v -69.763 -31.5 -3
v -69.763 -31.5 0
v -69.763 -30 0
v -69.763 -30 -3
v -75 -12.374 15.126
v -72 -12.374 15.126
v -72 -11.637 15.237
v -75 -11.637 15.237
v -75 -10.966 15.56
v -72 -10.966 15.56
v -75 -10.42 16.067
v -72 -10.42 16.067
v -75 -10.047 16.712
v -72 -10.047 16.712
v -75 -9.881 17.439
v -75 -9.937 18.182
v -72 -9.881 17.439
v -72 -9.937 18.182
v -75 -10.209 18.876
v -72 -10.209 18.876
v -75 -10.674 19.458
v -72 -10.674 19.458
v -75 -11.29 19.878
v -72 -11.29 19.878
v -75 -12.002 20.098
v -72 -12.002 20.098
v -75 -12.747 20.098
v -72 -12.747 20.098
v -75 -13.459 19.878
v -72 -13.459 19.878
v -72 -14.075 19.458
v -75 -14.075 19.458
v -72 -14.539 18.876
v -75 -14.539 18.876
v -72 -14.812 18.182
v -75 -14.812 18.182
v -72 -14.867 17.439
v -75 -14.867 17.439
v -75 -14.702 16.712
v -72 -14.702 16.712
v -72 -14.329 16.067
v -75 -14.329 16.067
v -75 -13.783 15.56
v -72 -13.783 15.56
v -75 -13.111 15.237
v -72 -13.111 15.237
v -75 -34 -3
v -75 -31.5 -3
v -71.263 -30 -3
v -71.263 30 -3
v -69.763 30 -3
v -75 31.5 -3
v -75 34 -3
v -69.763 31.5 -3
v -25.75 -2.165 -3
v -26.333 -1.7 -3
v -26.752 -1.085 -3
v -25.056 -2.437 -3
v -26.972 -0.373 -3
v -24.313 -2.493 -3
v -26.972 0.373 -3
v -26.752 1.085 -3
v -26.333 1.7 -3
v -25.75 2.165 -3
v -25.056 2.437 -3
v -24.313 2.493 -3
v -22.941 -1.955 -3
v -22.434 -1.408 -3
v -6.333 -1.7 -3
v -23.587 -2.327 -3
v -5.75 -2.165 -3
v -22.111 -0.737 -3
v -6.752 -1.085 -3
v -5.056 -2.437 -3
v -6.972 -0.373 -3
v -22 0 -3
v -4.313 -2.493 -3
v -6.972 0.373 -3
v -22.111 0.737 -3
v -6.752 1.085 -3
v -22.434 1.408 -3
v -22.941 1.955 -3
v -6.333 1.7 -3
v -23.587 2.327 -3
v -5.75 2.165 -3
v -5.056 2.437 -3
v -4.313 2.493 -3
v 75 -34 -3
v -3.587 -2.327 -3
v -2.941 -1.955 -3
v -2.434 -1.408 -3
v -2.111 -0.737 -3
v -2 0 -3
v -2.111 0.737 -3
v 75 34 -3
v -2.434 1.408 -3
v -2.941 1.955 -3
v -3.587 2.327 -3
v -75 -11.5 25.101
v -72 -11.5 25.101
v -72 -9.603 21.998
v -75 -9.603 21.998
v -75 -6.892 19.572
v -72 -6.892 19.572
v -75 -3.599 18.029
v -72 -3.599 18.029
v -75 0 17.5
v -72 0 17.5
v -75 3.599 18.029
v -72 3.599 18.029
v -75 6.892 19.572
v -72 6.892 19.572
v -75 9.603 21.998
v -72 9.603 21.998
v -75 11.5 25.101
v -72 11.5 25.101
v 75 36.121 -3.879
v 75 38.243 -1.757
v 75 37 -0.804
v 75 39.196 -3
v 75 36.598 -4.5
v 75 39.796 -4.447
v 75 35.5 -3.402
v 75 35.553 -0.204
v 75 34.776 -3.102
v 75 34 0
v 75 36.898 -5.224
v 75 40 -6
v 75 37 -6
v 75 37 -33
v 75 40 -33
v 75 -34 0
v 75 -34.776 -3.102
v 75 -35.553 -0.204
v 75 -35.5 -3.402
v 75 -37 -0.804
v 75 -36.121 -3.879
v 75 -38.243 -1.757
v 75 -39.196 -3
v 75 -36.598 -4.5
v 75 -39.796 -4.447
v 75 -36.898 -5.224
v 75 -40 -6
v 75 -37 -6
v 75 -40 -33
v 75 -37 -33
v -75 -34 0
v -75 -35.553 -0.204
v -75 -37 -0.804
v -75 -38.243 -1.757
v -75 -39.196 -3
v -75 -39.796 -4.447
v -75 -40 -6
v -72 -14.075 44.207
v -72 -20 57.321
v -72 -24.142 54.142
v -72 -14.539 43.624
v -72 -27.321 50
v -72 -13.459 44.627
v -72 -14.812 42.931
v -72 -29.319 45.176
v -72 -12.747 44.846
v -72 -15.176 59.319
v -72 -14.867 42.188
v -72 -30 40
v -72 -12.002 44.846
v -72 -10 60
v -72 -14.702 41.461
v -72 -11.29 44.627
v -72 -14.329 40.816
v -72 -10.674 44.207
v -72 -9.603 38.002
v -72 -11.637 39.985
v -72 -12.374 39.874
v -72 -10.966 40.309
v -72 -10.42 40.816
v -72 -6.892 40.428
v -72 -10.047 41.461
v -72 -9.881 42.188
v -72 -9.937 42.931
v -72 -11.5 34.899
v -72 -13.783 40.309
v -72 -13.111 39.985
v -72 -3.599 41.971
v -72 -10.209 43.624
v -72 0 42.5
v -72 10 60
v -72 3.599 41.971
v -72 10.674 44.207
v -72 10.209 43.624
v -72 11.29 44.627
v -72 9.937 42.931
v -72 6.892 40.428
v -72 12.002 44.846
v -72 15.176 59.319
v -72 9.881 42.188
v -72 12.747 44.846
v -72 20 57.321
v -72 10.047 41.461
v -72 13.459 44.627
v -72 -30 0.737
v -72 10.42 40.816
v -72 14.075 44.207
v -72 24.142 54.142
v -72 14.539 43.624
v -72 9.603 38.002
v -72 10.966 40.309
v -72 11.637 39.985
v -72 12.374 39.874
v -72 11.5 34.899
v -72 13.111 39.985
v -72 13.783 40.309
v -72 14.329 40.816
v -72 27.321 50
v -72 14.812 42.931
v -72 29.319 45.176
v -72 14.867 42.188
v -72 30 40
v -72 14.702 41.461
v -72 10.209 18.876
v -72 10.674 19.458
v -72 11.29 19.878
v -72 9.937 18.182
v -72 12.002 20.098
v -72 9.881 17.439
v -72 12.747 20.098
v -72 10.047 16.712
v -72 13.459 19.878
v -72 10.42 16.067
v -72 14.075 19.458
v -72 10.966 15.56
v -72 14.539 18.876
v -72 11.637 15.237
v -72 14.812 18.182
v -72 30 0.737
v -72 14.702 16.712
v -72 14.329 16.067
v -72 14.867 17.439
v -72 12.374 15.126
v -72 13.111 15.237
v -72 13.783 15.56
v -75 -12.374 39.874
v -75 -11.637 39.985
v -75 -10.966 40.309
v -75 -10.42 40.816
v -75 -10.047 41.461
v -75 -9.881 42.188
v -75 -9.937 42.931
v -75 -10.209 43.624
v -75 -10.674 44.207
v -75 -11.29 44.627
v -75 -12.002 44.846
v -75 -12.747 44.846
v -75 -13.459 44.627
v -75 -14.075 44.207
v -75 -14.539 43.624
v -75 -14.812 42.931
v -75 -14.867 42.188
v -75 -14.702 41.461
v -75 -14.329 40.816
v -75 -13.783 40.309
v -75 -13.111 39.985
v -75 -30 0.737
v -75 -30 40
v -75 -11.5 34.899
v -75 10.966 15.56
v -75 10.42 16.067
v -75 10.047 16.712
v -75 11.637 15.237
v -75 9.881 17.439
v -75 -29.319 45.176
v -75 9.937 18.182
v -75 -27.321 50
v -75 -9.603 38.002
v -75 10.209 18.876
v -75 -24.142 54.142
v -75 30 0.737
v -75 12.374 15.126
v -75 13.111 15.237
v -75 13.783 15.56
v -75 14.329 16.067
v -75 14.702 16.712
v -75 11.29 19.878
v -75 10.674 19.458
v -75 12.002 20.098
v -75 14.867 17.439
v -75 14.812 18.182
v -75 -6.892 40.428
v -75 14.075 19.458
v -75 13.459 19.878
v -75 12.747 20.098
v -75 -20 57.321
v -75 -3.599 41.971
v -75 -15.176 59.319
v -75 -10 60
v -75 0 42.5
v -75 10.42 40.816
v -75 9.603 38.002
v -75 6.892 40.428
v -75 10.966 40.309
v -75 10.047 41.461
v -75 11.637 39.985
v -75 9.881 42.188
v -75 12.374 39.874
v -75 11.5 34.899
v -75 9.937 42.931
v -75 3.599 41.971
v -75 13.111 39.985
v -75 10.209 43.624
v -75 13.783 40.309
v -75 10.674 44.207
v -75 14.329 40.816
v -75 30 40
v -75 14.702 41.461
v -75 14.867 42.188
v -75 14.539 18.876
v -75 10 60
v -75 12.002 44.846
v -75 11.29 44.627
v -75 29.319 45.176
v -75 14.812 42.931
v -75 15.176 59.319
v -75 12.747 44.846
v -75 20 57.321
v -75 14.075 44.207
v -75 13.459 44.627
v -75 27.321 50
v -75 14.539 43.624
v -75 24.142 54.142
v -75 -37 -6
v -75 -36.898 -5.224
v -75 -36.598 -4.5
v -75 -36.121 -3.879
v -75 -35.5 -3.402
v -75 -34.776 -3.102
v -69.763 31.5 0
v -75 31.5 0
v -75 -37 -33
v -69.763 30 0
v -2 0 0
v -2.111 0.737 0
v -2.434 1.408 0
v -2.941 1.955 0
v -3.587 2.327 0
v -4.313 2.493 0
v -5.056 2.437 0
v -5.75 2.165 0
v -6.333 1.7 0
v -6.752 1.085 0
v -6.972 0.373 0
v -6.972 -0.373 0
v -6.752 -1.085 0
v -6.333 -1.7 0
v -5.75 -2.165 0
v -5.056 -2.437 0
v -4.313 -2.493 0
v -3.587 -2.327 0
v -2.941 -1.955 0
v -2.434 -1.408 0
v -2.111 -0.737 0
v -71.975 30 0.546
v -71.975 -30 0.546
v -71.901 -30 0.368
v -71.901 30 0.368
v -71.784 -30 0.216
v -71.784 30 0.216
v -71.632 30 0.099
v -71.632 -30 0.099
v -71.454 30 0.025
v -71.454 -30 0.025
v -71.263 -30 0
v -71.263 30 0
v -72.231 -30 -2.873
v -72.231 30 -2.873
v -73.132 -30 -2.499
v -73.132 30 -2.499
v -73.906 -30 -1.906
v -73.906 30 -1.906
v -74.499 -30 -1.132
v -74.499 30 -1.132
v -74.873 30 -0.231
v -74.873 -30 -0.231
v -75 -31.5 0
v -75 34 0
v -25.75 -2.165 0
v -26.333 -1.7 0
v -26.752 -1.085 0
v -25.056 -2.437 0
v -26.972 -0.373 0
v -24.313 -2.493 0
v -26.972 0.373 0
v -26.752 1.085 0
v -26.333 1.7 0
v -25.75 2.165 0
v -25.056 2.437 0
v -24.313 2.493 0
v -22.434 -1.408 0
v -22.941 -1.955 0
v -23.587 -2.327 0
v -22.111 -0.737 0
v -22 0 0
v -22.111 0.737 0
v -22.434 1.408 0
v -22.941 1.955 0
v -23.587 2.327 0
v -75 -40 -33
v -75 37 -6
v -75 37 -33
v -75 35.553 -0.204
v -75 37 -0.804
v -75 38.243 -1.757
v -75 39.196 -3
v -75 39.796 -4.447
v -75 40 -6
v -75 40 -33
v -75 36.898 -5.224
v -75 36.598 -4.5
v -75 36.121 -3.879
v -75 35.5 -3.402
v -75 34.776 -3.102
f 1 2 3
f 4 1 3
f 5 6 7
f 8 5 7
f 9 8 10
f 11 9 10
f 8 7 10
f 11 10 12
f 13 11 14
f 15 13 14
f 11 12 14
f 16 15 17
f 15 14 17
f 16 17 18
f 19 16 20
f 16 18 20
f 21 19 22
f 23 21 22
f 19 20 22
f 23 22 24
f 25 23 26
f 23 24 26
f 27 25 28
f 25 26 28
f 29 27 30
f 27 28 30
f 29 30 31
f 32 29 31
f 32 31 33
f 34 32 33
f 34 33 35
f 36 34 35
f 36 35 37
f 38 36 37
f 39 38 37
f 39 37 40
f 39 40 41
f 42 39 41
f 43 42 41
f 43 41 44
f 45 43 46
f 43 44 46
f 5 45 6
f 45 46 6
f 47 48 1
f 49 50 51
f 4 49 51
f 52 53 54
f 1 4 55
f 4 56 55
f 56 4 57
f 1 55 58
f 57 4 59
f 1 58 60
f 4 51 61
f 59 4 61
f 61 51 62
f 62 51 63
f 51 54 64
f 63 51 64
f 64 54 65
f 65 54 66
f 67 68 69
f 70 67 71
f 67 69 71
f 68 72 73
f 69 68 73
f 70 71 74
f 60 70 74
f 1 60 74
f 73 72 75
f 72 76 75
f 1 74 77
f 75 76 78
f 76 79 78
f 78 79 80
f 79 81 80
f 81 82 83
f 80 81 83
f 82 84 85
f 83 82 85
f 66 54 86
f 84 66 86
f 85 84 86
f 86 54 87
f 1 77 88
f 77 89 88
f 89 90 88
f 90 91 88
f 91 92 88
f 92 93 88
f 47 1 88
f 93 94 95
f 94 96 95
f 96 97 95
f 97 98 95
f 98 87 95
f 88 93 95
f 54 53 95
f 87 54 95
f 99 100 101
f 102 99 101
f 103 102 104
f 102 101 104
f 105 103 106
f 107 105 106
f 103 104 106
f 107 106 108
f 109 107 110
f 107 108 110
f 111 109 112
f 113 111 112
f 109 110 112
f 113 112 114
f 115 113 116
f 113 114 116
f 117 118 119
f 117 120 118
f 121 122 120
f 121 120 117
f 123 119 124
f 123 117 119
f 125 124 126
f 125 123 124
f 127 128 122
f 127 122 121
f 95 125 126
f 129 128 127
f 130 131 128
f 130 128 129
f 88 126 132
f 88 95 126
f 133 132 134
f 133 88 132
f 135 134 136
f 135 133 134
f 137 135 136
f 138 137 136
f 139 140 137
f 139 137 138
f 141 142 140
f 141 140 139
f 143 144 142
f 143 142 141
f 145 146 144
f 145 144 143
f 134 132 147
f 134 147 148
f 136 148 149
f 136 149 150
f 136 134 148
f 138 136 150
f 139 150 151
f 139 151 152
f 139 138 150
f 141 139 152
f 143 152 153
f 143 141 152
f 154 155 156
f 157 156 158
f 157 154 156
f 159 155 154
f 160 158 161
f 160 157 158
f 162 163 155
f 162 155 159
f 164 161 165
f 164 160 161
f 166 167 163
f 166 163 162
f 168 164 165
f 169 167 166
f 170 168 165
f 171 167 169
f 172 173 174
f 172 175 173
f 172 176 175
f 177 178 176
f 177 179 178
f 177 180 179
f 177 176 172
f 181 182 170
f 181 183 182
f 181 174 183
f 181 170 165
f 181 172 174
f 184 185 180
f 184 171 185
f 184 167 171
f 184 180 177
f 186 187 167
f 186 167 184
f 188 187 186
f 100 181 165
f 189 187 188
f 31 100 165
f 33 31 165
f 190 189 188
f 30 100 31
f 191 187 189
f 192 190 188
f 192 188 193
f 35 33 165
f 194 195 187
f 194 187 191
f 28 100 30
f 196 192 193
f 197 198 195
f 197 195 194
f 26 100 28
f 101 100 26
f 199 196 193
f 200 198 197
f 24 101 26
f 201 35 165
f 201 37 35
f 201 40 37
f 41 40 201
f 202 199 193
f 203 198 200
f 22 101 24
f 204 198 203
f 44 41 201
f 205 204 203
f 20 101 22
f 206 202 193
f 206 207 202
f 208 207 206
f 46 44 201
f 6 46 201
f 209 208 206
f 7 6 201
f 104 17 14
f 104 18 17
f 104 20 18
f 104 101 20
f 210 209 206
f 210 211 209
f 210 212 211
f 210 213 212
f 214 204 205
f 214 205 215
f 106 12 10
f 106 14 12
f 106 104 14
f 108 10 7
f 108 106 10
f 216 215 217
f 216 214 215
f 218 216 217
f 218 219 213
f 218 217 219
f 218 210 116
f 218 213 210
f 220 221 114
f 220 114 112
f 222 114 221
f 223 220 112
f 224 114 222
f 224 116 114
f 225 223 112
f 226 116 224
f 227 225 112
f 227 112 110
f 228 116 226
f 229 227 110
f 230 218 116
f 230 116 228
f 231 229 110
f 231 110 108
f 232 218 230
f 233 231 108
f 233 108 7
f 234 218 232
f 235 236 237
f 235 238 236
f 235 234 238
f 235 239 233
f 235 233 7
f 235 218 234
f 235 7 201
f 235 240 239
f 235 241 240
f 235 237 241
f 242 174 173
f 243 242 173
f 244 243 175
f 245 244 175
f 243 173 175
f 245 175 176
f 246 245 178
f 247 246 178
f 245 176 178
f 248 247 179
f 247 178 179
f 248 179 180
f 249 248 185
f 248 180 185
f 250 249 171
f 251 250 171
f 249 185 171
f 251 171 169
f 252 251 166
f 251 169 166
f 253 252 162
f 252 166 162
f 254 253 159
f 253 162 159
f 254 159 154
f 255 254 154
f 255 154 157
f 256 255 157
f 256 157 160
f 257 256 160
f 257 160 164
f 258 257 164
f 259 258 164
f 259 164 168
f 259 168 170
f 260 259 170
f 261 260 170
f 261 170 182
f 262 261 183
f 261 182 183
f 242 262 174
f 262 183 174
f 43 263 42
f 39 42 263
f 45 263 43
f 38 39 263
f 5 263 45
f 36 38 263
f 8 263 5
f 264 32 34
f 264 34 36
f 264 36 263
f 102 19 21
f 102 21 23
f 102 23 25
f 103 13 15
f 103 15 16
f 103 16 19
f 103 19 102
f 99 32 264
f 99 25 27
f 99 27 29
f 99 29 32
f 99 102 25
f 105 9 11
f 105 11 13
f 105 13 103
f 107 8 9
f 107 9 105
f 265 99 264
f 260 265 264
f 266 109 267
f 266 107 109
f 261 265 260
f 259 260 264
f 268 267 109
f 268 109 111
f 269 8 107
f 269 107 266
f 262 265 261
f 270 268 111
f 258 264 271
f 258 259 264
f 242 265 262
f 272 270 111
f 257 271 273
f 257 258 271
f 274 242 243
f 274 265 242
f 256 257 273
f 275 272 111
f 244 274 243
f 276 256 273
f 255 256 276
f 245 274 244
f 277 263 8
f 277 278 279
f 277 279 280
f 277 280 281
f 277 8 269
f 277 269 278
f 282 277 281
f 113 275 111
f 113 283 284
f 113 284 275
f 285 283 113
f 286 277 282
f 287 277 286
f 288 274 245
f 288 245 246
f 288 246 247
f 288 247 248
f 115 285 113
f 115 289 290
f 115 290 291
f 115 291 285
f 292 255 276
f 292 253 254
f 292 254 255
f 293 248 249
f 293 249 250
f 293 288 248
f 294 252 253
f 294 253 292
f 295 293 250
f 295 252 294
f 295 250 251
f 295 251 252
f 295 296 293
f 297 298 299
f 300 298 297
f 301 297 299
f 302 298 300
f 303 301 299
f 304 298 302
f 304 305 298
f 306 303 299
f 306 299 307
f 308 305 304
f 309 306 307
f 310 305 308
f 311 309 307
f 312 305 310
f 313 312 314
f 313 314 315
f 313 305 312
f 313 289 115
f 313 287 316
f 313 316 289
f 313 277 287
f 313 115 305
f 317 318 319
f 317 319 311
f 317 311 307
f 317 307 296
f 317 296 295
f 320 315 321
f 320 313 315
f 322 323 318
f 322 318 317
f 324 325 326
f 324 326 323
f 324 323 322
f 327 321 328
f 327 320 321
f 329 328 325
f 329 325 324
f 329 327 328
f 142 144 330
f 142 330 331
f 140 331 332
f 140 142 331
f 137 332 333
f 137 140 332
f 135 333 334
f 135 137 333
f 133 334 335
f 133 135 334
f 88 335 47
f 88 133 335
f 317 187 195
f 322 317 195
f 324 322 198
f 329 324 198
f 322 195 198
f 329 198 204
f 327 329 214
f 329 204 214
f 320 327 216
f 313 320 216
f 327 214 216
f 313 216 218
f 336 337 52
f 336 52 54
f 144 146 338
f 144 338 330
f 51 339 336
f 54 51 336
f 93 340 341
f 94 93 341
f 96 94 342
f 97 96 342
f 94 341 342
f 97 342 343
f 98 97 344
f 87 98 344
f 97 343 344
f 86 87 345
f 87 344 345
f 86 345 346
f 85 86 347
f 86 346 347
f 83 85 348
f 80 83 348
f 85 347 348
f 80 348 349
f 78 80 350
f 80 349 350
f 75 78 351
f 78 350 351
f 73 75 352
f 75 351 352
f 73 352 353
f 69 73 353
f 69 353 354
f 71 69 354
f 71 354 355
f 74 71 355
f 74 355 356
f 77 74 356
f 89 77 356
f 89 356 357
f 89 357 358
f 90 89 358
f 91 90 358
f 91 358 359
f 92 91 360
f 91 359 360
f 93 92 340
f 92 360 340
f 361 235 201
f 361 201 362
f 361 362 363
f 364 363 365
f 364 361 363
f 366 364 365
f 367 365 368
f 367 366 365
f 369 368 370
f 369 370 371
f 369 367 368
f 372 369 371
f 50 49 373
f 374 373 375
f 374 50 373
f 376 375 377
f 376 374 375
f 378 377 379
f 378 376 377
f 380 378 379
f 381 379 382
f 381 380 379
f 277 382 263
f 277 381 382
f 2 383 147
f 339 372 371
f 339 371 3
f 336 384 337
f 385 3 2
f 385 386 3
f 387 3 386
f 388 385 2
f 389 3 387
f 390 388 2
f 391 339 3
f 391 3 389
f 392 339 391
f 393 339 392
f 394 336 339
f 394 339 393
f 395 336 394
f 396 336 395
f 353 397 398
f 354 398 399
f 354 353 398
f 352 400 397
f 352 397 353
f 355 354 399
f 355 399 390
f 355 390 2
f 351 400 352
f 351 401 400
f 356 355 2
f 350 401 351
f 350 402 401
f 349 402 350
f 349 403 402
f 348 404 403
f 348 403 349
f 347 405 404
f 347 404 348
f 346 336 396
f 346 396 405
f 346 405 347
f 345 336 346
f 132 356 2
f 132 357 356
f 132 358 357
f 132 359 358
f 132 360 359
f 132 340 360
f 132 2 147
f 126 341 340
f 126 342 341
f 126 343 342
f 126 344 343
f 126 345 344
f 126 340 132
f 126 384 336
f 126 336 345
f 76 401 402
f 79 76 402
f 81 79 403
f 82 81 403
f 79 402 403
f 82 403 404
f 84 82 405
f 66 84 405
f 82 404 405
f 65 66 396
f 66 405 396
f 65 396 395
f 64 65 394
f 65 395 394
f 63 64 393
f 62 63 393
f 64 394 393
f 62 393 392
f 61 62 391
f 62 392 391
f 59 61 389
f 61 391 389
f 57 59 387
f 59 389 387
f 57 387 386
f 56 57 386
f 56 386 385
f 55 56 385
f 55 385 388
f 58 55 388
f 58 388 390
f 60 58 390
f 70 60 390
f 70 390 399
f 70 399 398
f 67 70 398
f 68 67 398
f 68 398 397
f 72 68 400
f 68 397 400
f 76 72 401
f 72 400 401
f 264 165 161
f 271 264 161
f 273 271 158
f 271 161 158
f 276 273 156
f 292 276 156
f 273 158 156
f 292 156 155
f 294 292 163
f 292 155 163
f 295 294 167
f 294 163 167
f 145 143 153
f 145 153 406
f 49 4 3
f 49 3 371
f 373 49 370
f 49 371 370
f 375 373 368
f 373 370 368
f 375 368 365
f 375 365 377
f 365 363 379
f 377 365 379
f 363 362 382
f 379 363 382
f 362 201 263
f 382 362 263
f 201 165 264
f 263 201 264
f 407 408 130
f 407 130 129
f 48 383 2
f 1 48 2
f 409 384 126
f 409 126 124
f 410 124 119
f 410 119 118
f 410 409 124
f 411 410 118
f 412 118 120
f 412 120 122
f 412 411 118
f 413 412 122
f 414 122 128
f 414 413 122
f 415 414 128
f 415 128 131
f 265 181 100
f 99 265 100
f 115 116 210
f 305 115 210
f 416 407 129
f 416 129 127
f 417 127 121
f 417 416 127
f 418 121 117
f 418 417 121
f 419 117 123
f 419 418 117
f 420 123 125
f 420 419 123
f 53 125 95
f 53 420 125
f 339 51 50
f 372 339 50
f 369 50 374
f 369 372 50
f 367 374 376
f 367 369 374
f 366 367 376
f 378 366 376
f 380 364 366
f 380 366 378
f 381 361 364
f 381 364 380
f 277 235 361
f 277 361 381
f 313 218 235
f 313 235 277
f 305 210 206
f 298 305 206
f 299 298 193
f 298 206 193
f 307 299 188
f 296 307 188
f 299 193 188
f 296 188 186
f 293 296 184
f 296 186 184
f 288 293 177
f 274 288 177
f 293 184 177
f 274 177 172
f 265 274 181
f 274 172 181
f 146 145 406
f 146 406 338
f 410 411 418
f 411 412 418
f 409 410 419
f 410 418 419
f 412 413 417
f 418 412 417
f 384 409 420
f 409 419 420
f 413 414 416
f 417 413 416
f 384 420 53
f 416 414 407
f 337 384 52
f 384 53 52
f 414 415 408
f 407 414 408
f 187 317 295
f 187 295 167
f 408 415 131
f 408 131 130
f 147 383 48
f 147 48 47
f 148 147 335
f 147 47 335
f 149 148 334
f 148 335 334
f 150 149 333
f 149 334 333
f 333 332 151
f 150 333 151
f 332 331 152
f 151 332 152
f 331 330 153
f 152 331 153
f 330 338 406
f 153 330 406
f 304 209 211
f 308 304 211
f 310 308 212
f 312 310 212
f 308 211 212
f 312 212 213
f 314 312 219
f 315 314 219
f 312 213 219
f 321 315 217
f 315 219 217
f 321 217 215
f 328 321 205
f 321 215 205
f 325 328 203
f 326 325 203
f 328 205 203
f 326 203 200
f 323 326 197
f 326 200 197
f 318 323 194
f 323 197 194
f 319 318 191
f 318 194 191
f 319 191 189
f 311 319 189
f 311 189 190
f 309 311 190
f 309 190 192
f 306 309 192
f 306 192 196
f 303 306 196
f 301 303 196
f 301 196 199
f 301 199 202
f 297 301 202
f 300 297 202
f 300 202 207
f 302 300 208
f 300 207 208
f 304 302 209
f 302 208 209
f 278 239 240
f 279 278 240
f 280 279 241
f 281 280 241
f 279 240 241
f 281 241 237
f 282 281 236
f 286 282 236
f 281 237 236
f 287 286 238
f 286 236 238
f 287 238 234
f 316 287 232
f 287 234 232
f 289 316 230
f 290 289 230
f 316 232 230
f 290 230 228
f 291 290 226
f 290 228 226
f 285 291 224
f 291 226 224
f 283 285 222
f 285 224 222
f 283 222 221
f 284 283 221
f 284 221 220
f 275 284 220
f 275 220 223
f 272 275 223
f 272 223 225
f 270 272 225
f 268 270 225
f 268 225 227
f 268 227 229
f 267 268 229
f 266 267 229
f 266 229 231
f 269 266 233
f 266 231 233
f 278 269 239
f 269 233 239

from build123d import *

# Parameters (mm, degrees)
SCHIZZO1_W                       = 150
SCHIZZO1_H                       = 80
BASE_FLANGIA1_DEPTH              = 3
BORDO_FLANGIA1_STRIP_W           = 18
BORDO_FLANGIA1_STRIP_H           = 3
BORDO_FLANGIA1_STRIP_CUT_DEPTH   = 150
BORDO_FLANGIA1_STRIP_2_W         = 18
BORDO_FLANGIA1_STRIP_2_H         = 3
BORDO_FLANGIA1_STRIP_CUT_2_DEPTH = 150
BORDO_FLANGIA1_DEPTH             = 150
BORDO_FLANGIA1_BEND_DEPTH        = 150
BORDO_FLANGIA3_STRIP_W           = 13.4732
BORDO_FLANGIA3_STRIP_H           = 3
BORDO_FLANGIA3_STRIP_CUT_DEPTH   = 60
BORDO_FLANGIA3_RELIEF_W          = 14.9732
BORDO_FLANGIA3_RELIEF_H          = 1.5
BORDO_FLANGIA3_RELIEF_CUT_DEPTH  = 3
BORDO_FLANGIA3_DEPTH             = 60
SCHIZZO28_R                      = 2.5
TAGLIO_ESTRUSIONE1_DEPTH         = 3
SCHIZZO30_R                      = 2.5
TAGLIO_ESTRUSIONE2_DEPTH         = 3


# Sheet-metal steps are written as plain solids
with BuildPart() as part:
    # Schizzo1 → Base-Flangia1 (new body)
    with BuildSketch(Plane.XY):
        Rectangle(SCHIZZO1_W, SCHIZZO1_H)
    extrude(amount=-BASE_FLANGIA1_DEPTH)

    # Bordo-Flangia1 strip (across the edge) → Bordo-Flangia1 strip cut (cut)
    with BuildSketch(Plane(origin=(-75, 40, -3), x_dir=(0, -1, 0), z_dir=(1, 0, 0))):
        with Locations((-3, -1.5)):
            Rectangle(BORDO_FLANGIA1_STRIP_W, BORDO_FLANGIA1_STRIP_H)
    extrude(amount=BORDO_FLANGIA1_STRIP_CUT_DEPTH, mode=Mode.SUBTRACT)

    # Bordo-Flangia1 strip 2 (across the edge) → Bordo-Flangia1 strip cut 2 (cut)
    with BuildSketch(Plane(origin=(75, -40, -3), x_dir=(0, 1, 0), z_dir=(-1, 0, 0))):
        with Locations((-3, -1.5)):
            Rectangle(BORDO_FLANGIA1_STRIP_2_W, BORDO_FLANGIA1_STRIP_2_H)
    extrude(amount=BORDO_FLANGIA1_STRIP_CUT_2_DEPTH, mode=Mode.SUBTRACT)

    # Bordo-Flangia1 section (across the edge) → Bordo-Flangia1 (add)
    with BuildSketch(Plane(origin=(-75, 40, -3), x_dir=(0, -1, 0), z_dir=(1, 0, 0))):
        with BuildLine():
            Line((0, 3), (0, 30))
            Line((0, 30), (3, 30))
            Line((3, 30), (3, 3))
            ThreePointArc((3, 3), (3.878679656, 0.878679656), (6, 0))
            Line((6, 0), (6, -3))
            ThreePointArc((6, -3), (1.757359313, -1.242640687), (0, 3))
        make_face()
    extrude(amount=BORDO_FLANGIA1_DEPTH)

    # Bordo-Flangia1 section 2 (across the edge) → Bordo-Flangia1 bend (add)
    with BuildSketch(Plane(origin=(75, -40, -3), x_dir=(0, 1, 0), z_dir=(-1, 0, 0))):
        with BuildLine():
            Line((0, 3), (0, 30))
            Line((0, 30), (3, 30))
            Line((3, 30), (3, 3))
            ThreePointArc((3, 3), (3.878679656, 0.878679656), (6, 0))
            Line((6, 0), (6, -3))
            ThreePointArc((6, -3), (1.757359313, -1.242640687), (0, 3))
        make_face()
    extrude(amount=BORDO_FLANGIA1_BEND_DEPTH)

    # Bordo-Flangia3 strip (across the edge) → Bordo-Flangia3 strip cut (cut)
    with BuildSketch(Plane(origin=(-75, 30, 0), x_dir=(1, 0, 0), z_dir=(0, -1, 0))):
        with Locations((-3, -1.5)):
            Rectangle(BORDO_FLANGIA3_STRIP_W, BORDO_FLANGIA3_STRIP_H)
    extrude(amount=BORDO_FLANGIA3_STRIP_CUT_DEPTH, mode=Mode.SUBTRACT)

    # Bordo-Flangia3 relief (on the sheet) → Bordo-Flangia3 relief cut (cut)
    with BuildSketch(Plane(origin=(-71.2634, 30, 0), x_dir=(1, 0, 0), z_dir=(0, 0, 1))):
        with Locations((-5.9866, 0.75)):
            Rectangle(BORDO_FLANGIA3_RELIEF_W, BORDO_FLANGIA3_RELIEF_H)
        with Locations((-5.9866, -60.75)):
            Rectangle(BORDO_FLANGIA3_RELIEF_W, BORDO_FLANGIA3_RELIEF_H)
    extrude(amount=-BORDO_FLANGIA3_RELIEF_CUT_DEPTH, mode=Mode.SUBTRACT)

    # Bordo-Flangia3 section (across the edge) → Bordo-Flangia3 (add)
    with BuildSketch(Plane(origin=(-75, 30, 0), x_dir=(1, 0, 0), z_dir=(0, -1, 0))):
        with BuildLine():
            Line((0, 0.7366), (0, 60))
            Line((0, 60), (3, 60))
            Line((3, 60), (3, 0.7366))
            ThreePointArc((3, 0.7366), (3.215745145, 0.215745145), (3.7366, 0))
            Line((3.7366, 0), (3.7366, -3))
            ThreePointArc((3.7366, -3), (1.094424801, -1.905575199), (0, 0.7366))
        make_face()
    extrude(amount=BORDO_FLANGIA3_DEPTH)

    # Schizzo28 → Taglio-Estrusione1 (cut)
    with BuildSketch(Plane(origin=(-72, 0, 0), x_dir=(0, 0, -1), z_dir=(1, 0, 0))):
        with BuildLine():
            Line((-60, 30), (-60, 10))
            ThreePointArc((-60, 10), (-54.142135624, 24.142135624), (-40, 30))
            Line((-40, 30), (-60, 30))
        make_face()
        with BuildLine():
            ThreePointArc((-40, -30), (-54.142135624, -24.142135624), (-60, -10))
            Line((-60, -10), (-60, -30))
            Line((-60, -30), (-40, -30))
        make_face()
        with BuildLine():
            Line((-34.898979486, -11.5), (-25.101020514, -11.5))
            ThreePointArc((-25.101020514, -11.5), (-17.5, 0), (-25.101020514, 11.5))
            Line((-25.101020514, 11.5), (-34.898979486, 11.5))
            ThreePointArc((-34.898979486, 11.5), (-42.5, 0), (-34.898979486, -11.5))
        make_face()
        with Locations((-42.374368671, 12.374368671)):
            Circle(SCHIZZO28_R)
        with Locations((-17.625631329, 12.374368671)):
            Circle(SCHIZZO28_R)
        with Locations((-17.625631329, -12.374368671)):
            Circle(SCHIZZO28_R)
        with Locations((-42.374368671, -12.374368671)):
            Circle(SCHIZZO28_R)
    extrude(amount=-TAGLIO_ESTRUSIONE1_DEPTH, mode=Mode.SUBTRACT)

    # Schizzo30 → Taglio-Estrusione2 (cut)
    with BuildSketch(Plane.XY):
        with Locations((-24.5, 0)):
            Circle(SCHIZZO30_R)
        with Locations((-4.5, 0)):
            Circle(SCHIZZO30_R)
    extrude(amount=-TAGLIO_ESTRUSIONE2_DEPTH, mode=Mode.SUBTRACT)


solid = part.part
